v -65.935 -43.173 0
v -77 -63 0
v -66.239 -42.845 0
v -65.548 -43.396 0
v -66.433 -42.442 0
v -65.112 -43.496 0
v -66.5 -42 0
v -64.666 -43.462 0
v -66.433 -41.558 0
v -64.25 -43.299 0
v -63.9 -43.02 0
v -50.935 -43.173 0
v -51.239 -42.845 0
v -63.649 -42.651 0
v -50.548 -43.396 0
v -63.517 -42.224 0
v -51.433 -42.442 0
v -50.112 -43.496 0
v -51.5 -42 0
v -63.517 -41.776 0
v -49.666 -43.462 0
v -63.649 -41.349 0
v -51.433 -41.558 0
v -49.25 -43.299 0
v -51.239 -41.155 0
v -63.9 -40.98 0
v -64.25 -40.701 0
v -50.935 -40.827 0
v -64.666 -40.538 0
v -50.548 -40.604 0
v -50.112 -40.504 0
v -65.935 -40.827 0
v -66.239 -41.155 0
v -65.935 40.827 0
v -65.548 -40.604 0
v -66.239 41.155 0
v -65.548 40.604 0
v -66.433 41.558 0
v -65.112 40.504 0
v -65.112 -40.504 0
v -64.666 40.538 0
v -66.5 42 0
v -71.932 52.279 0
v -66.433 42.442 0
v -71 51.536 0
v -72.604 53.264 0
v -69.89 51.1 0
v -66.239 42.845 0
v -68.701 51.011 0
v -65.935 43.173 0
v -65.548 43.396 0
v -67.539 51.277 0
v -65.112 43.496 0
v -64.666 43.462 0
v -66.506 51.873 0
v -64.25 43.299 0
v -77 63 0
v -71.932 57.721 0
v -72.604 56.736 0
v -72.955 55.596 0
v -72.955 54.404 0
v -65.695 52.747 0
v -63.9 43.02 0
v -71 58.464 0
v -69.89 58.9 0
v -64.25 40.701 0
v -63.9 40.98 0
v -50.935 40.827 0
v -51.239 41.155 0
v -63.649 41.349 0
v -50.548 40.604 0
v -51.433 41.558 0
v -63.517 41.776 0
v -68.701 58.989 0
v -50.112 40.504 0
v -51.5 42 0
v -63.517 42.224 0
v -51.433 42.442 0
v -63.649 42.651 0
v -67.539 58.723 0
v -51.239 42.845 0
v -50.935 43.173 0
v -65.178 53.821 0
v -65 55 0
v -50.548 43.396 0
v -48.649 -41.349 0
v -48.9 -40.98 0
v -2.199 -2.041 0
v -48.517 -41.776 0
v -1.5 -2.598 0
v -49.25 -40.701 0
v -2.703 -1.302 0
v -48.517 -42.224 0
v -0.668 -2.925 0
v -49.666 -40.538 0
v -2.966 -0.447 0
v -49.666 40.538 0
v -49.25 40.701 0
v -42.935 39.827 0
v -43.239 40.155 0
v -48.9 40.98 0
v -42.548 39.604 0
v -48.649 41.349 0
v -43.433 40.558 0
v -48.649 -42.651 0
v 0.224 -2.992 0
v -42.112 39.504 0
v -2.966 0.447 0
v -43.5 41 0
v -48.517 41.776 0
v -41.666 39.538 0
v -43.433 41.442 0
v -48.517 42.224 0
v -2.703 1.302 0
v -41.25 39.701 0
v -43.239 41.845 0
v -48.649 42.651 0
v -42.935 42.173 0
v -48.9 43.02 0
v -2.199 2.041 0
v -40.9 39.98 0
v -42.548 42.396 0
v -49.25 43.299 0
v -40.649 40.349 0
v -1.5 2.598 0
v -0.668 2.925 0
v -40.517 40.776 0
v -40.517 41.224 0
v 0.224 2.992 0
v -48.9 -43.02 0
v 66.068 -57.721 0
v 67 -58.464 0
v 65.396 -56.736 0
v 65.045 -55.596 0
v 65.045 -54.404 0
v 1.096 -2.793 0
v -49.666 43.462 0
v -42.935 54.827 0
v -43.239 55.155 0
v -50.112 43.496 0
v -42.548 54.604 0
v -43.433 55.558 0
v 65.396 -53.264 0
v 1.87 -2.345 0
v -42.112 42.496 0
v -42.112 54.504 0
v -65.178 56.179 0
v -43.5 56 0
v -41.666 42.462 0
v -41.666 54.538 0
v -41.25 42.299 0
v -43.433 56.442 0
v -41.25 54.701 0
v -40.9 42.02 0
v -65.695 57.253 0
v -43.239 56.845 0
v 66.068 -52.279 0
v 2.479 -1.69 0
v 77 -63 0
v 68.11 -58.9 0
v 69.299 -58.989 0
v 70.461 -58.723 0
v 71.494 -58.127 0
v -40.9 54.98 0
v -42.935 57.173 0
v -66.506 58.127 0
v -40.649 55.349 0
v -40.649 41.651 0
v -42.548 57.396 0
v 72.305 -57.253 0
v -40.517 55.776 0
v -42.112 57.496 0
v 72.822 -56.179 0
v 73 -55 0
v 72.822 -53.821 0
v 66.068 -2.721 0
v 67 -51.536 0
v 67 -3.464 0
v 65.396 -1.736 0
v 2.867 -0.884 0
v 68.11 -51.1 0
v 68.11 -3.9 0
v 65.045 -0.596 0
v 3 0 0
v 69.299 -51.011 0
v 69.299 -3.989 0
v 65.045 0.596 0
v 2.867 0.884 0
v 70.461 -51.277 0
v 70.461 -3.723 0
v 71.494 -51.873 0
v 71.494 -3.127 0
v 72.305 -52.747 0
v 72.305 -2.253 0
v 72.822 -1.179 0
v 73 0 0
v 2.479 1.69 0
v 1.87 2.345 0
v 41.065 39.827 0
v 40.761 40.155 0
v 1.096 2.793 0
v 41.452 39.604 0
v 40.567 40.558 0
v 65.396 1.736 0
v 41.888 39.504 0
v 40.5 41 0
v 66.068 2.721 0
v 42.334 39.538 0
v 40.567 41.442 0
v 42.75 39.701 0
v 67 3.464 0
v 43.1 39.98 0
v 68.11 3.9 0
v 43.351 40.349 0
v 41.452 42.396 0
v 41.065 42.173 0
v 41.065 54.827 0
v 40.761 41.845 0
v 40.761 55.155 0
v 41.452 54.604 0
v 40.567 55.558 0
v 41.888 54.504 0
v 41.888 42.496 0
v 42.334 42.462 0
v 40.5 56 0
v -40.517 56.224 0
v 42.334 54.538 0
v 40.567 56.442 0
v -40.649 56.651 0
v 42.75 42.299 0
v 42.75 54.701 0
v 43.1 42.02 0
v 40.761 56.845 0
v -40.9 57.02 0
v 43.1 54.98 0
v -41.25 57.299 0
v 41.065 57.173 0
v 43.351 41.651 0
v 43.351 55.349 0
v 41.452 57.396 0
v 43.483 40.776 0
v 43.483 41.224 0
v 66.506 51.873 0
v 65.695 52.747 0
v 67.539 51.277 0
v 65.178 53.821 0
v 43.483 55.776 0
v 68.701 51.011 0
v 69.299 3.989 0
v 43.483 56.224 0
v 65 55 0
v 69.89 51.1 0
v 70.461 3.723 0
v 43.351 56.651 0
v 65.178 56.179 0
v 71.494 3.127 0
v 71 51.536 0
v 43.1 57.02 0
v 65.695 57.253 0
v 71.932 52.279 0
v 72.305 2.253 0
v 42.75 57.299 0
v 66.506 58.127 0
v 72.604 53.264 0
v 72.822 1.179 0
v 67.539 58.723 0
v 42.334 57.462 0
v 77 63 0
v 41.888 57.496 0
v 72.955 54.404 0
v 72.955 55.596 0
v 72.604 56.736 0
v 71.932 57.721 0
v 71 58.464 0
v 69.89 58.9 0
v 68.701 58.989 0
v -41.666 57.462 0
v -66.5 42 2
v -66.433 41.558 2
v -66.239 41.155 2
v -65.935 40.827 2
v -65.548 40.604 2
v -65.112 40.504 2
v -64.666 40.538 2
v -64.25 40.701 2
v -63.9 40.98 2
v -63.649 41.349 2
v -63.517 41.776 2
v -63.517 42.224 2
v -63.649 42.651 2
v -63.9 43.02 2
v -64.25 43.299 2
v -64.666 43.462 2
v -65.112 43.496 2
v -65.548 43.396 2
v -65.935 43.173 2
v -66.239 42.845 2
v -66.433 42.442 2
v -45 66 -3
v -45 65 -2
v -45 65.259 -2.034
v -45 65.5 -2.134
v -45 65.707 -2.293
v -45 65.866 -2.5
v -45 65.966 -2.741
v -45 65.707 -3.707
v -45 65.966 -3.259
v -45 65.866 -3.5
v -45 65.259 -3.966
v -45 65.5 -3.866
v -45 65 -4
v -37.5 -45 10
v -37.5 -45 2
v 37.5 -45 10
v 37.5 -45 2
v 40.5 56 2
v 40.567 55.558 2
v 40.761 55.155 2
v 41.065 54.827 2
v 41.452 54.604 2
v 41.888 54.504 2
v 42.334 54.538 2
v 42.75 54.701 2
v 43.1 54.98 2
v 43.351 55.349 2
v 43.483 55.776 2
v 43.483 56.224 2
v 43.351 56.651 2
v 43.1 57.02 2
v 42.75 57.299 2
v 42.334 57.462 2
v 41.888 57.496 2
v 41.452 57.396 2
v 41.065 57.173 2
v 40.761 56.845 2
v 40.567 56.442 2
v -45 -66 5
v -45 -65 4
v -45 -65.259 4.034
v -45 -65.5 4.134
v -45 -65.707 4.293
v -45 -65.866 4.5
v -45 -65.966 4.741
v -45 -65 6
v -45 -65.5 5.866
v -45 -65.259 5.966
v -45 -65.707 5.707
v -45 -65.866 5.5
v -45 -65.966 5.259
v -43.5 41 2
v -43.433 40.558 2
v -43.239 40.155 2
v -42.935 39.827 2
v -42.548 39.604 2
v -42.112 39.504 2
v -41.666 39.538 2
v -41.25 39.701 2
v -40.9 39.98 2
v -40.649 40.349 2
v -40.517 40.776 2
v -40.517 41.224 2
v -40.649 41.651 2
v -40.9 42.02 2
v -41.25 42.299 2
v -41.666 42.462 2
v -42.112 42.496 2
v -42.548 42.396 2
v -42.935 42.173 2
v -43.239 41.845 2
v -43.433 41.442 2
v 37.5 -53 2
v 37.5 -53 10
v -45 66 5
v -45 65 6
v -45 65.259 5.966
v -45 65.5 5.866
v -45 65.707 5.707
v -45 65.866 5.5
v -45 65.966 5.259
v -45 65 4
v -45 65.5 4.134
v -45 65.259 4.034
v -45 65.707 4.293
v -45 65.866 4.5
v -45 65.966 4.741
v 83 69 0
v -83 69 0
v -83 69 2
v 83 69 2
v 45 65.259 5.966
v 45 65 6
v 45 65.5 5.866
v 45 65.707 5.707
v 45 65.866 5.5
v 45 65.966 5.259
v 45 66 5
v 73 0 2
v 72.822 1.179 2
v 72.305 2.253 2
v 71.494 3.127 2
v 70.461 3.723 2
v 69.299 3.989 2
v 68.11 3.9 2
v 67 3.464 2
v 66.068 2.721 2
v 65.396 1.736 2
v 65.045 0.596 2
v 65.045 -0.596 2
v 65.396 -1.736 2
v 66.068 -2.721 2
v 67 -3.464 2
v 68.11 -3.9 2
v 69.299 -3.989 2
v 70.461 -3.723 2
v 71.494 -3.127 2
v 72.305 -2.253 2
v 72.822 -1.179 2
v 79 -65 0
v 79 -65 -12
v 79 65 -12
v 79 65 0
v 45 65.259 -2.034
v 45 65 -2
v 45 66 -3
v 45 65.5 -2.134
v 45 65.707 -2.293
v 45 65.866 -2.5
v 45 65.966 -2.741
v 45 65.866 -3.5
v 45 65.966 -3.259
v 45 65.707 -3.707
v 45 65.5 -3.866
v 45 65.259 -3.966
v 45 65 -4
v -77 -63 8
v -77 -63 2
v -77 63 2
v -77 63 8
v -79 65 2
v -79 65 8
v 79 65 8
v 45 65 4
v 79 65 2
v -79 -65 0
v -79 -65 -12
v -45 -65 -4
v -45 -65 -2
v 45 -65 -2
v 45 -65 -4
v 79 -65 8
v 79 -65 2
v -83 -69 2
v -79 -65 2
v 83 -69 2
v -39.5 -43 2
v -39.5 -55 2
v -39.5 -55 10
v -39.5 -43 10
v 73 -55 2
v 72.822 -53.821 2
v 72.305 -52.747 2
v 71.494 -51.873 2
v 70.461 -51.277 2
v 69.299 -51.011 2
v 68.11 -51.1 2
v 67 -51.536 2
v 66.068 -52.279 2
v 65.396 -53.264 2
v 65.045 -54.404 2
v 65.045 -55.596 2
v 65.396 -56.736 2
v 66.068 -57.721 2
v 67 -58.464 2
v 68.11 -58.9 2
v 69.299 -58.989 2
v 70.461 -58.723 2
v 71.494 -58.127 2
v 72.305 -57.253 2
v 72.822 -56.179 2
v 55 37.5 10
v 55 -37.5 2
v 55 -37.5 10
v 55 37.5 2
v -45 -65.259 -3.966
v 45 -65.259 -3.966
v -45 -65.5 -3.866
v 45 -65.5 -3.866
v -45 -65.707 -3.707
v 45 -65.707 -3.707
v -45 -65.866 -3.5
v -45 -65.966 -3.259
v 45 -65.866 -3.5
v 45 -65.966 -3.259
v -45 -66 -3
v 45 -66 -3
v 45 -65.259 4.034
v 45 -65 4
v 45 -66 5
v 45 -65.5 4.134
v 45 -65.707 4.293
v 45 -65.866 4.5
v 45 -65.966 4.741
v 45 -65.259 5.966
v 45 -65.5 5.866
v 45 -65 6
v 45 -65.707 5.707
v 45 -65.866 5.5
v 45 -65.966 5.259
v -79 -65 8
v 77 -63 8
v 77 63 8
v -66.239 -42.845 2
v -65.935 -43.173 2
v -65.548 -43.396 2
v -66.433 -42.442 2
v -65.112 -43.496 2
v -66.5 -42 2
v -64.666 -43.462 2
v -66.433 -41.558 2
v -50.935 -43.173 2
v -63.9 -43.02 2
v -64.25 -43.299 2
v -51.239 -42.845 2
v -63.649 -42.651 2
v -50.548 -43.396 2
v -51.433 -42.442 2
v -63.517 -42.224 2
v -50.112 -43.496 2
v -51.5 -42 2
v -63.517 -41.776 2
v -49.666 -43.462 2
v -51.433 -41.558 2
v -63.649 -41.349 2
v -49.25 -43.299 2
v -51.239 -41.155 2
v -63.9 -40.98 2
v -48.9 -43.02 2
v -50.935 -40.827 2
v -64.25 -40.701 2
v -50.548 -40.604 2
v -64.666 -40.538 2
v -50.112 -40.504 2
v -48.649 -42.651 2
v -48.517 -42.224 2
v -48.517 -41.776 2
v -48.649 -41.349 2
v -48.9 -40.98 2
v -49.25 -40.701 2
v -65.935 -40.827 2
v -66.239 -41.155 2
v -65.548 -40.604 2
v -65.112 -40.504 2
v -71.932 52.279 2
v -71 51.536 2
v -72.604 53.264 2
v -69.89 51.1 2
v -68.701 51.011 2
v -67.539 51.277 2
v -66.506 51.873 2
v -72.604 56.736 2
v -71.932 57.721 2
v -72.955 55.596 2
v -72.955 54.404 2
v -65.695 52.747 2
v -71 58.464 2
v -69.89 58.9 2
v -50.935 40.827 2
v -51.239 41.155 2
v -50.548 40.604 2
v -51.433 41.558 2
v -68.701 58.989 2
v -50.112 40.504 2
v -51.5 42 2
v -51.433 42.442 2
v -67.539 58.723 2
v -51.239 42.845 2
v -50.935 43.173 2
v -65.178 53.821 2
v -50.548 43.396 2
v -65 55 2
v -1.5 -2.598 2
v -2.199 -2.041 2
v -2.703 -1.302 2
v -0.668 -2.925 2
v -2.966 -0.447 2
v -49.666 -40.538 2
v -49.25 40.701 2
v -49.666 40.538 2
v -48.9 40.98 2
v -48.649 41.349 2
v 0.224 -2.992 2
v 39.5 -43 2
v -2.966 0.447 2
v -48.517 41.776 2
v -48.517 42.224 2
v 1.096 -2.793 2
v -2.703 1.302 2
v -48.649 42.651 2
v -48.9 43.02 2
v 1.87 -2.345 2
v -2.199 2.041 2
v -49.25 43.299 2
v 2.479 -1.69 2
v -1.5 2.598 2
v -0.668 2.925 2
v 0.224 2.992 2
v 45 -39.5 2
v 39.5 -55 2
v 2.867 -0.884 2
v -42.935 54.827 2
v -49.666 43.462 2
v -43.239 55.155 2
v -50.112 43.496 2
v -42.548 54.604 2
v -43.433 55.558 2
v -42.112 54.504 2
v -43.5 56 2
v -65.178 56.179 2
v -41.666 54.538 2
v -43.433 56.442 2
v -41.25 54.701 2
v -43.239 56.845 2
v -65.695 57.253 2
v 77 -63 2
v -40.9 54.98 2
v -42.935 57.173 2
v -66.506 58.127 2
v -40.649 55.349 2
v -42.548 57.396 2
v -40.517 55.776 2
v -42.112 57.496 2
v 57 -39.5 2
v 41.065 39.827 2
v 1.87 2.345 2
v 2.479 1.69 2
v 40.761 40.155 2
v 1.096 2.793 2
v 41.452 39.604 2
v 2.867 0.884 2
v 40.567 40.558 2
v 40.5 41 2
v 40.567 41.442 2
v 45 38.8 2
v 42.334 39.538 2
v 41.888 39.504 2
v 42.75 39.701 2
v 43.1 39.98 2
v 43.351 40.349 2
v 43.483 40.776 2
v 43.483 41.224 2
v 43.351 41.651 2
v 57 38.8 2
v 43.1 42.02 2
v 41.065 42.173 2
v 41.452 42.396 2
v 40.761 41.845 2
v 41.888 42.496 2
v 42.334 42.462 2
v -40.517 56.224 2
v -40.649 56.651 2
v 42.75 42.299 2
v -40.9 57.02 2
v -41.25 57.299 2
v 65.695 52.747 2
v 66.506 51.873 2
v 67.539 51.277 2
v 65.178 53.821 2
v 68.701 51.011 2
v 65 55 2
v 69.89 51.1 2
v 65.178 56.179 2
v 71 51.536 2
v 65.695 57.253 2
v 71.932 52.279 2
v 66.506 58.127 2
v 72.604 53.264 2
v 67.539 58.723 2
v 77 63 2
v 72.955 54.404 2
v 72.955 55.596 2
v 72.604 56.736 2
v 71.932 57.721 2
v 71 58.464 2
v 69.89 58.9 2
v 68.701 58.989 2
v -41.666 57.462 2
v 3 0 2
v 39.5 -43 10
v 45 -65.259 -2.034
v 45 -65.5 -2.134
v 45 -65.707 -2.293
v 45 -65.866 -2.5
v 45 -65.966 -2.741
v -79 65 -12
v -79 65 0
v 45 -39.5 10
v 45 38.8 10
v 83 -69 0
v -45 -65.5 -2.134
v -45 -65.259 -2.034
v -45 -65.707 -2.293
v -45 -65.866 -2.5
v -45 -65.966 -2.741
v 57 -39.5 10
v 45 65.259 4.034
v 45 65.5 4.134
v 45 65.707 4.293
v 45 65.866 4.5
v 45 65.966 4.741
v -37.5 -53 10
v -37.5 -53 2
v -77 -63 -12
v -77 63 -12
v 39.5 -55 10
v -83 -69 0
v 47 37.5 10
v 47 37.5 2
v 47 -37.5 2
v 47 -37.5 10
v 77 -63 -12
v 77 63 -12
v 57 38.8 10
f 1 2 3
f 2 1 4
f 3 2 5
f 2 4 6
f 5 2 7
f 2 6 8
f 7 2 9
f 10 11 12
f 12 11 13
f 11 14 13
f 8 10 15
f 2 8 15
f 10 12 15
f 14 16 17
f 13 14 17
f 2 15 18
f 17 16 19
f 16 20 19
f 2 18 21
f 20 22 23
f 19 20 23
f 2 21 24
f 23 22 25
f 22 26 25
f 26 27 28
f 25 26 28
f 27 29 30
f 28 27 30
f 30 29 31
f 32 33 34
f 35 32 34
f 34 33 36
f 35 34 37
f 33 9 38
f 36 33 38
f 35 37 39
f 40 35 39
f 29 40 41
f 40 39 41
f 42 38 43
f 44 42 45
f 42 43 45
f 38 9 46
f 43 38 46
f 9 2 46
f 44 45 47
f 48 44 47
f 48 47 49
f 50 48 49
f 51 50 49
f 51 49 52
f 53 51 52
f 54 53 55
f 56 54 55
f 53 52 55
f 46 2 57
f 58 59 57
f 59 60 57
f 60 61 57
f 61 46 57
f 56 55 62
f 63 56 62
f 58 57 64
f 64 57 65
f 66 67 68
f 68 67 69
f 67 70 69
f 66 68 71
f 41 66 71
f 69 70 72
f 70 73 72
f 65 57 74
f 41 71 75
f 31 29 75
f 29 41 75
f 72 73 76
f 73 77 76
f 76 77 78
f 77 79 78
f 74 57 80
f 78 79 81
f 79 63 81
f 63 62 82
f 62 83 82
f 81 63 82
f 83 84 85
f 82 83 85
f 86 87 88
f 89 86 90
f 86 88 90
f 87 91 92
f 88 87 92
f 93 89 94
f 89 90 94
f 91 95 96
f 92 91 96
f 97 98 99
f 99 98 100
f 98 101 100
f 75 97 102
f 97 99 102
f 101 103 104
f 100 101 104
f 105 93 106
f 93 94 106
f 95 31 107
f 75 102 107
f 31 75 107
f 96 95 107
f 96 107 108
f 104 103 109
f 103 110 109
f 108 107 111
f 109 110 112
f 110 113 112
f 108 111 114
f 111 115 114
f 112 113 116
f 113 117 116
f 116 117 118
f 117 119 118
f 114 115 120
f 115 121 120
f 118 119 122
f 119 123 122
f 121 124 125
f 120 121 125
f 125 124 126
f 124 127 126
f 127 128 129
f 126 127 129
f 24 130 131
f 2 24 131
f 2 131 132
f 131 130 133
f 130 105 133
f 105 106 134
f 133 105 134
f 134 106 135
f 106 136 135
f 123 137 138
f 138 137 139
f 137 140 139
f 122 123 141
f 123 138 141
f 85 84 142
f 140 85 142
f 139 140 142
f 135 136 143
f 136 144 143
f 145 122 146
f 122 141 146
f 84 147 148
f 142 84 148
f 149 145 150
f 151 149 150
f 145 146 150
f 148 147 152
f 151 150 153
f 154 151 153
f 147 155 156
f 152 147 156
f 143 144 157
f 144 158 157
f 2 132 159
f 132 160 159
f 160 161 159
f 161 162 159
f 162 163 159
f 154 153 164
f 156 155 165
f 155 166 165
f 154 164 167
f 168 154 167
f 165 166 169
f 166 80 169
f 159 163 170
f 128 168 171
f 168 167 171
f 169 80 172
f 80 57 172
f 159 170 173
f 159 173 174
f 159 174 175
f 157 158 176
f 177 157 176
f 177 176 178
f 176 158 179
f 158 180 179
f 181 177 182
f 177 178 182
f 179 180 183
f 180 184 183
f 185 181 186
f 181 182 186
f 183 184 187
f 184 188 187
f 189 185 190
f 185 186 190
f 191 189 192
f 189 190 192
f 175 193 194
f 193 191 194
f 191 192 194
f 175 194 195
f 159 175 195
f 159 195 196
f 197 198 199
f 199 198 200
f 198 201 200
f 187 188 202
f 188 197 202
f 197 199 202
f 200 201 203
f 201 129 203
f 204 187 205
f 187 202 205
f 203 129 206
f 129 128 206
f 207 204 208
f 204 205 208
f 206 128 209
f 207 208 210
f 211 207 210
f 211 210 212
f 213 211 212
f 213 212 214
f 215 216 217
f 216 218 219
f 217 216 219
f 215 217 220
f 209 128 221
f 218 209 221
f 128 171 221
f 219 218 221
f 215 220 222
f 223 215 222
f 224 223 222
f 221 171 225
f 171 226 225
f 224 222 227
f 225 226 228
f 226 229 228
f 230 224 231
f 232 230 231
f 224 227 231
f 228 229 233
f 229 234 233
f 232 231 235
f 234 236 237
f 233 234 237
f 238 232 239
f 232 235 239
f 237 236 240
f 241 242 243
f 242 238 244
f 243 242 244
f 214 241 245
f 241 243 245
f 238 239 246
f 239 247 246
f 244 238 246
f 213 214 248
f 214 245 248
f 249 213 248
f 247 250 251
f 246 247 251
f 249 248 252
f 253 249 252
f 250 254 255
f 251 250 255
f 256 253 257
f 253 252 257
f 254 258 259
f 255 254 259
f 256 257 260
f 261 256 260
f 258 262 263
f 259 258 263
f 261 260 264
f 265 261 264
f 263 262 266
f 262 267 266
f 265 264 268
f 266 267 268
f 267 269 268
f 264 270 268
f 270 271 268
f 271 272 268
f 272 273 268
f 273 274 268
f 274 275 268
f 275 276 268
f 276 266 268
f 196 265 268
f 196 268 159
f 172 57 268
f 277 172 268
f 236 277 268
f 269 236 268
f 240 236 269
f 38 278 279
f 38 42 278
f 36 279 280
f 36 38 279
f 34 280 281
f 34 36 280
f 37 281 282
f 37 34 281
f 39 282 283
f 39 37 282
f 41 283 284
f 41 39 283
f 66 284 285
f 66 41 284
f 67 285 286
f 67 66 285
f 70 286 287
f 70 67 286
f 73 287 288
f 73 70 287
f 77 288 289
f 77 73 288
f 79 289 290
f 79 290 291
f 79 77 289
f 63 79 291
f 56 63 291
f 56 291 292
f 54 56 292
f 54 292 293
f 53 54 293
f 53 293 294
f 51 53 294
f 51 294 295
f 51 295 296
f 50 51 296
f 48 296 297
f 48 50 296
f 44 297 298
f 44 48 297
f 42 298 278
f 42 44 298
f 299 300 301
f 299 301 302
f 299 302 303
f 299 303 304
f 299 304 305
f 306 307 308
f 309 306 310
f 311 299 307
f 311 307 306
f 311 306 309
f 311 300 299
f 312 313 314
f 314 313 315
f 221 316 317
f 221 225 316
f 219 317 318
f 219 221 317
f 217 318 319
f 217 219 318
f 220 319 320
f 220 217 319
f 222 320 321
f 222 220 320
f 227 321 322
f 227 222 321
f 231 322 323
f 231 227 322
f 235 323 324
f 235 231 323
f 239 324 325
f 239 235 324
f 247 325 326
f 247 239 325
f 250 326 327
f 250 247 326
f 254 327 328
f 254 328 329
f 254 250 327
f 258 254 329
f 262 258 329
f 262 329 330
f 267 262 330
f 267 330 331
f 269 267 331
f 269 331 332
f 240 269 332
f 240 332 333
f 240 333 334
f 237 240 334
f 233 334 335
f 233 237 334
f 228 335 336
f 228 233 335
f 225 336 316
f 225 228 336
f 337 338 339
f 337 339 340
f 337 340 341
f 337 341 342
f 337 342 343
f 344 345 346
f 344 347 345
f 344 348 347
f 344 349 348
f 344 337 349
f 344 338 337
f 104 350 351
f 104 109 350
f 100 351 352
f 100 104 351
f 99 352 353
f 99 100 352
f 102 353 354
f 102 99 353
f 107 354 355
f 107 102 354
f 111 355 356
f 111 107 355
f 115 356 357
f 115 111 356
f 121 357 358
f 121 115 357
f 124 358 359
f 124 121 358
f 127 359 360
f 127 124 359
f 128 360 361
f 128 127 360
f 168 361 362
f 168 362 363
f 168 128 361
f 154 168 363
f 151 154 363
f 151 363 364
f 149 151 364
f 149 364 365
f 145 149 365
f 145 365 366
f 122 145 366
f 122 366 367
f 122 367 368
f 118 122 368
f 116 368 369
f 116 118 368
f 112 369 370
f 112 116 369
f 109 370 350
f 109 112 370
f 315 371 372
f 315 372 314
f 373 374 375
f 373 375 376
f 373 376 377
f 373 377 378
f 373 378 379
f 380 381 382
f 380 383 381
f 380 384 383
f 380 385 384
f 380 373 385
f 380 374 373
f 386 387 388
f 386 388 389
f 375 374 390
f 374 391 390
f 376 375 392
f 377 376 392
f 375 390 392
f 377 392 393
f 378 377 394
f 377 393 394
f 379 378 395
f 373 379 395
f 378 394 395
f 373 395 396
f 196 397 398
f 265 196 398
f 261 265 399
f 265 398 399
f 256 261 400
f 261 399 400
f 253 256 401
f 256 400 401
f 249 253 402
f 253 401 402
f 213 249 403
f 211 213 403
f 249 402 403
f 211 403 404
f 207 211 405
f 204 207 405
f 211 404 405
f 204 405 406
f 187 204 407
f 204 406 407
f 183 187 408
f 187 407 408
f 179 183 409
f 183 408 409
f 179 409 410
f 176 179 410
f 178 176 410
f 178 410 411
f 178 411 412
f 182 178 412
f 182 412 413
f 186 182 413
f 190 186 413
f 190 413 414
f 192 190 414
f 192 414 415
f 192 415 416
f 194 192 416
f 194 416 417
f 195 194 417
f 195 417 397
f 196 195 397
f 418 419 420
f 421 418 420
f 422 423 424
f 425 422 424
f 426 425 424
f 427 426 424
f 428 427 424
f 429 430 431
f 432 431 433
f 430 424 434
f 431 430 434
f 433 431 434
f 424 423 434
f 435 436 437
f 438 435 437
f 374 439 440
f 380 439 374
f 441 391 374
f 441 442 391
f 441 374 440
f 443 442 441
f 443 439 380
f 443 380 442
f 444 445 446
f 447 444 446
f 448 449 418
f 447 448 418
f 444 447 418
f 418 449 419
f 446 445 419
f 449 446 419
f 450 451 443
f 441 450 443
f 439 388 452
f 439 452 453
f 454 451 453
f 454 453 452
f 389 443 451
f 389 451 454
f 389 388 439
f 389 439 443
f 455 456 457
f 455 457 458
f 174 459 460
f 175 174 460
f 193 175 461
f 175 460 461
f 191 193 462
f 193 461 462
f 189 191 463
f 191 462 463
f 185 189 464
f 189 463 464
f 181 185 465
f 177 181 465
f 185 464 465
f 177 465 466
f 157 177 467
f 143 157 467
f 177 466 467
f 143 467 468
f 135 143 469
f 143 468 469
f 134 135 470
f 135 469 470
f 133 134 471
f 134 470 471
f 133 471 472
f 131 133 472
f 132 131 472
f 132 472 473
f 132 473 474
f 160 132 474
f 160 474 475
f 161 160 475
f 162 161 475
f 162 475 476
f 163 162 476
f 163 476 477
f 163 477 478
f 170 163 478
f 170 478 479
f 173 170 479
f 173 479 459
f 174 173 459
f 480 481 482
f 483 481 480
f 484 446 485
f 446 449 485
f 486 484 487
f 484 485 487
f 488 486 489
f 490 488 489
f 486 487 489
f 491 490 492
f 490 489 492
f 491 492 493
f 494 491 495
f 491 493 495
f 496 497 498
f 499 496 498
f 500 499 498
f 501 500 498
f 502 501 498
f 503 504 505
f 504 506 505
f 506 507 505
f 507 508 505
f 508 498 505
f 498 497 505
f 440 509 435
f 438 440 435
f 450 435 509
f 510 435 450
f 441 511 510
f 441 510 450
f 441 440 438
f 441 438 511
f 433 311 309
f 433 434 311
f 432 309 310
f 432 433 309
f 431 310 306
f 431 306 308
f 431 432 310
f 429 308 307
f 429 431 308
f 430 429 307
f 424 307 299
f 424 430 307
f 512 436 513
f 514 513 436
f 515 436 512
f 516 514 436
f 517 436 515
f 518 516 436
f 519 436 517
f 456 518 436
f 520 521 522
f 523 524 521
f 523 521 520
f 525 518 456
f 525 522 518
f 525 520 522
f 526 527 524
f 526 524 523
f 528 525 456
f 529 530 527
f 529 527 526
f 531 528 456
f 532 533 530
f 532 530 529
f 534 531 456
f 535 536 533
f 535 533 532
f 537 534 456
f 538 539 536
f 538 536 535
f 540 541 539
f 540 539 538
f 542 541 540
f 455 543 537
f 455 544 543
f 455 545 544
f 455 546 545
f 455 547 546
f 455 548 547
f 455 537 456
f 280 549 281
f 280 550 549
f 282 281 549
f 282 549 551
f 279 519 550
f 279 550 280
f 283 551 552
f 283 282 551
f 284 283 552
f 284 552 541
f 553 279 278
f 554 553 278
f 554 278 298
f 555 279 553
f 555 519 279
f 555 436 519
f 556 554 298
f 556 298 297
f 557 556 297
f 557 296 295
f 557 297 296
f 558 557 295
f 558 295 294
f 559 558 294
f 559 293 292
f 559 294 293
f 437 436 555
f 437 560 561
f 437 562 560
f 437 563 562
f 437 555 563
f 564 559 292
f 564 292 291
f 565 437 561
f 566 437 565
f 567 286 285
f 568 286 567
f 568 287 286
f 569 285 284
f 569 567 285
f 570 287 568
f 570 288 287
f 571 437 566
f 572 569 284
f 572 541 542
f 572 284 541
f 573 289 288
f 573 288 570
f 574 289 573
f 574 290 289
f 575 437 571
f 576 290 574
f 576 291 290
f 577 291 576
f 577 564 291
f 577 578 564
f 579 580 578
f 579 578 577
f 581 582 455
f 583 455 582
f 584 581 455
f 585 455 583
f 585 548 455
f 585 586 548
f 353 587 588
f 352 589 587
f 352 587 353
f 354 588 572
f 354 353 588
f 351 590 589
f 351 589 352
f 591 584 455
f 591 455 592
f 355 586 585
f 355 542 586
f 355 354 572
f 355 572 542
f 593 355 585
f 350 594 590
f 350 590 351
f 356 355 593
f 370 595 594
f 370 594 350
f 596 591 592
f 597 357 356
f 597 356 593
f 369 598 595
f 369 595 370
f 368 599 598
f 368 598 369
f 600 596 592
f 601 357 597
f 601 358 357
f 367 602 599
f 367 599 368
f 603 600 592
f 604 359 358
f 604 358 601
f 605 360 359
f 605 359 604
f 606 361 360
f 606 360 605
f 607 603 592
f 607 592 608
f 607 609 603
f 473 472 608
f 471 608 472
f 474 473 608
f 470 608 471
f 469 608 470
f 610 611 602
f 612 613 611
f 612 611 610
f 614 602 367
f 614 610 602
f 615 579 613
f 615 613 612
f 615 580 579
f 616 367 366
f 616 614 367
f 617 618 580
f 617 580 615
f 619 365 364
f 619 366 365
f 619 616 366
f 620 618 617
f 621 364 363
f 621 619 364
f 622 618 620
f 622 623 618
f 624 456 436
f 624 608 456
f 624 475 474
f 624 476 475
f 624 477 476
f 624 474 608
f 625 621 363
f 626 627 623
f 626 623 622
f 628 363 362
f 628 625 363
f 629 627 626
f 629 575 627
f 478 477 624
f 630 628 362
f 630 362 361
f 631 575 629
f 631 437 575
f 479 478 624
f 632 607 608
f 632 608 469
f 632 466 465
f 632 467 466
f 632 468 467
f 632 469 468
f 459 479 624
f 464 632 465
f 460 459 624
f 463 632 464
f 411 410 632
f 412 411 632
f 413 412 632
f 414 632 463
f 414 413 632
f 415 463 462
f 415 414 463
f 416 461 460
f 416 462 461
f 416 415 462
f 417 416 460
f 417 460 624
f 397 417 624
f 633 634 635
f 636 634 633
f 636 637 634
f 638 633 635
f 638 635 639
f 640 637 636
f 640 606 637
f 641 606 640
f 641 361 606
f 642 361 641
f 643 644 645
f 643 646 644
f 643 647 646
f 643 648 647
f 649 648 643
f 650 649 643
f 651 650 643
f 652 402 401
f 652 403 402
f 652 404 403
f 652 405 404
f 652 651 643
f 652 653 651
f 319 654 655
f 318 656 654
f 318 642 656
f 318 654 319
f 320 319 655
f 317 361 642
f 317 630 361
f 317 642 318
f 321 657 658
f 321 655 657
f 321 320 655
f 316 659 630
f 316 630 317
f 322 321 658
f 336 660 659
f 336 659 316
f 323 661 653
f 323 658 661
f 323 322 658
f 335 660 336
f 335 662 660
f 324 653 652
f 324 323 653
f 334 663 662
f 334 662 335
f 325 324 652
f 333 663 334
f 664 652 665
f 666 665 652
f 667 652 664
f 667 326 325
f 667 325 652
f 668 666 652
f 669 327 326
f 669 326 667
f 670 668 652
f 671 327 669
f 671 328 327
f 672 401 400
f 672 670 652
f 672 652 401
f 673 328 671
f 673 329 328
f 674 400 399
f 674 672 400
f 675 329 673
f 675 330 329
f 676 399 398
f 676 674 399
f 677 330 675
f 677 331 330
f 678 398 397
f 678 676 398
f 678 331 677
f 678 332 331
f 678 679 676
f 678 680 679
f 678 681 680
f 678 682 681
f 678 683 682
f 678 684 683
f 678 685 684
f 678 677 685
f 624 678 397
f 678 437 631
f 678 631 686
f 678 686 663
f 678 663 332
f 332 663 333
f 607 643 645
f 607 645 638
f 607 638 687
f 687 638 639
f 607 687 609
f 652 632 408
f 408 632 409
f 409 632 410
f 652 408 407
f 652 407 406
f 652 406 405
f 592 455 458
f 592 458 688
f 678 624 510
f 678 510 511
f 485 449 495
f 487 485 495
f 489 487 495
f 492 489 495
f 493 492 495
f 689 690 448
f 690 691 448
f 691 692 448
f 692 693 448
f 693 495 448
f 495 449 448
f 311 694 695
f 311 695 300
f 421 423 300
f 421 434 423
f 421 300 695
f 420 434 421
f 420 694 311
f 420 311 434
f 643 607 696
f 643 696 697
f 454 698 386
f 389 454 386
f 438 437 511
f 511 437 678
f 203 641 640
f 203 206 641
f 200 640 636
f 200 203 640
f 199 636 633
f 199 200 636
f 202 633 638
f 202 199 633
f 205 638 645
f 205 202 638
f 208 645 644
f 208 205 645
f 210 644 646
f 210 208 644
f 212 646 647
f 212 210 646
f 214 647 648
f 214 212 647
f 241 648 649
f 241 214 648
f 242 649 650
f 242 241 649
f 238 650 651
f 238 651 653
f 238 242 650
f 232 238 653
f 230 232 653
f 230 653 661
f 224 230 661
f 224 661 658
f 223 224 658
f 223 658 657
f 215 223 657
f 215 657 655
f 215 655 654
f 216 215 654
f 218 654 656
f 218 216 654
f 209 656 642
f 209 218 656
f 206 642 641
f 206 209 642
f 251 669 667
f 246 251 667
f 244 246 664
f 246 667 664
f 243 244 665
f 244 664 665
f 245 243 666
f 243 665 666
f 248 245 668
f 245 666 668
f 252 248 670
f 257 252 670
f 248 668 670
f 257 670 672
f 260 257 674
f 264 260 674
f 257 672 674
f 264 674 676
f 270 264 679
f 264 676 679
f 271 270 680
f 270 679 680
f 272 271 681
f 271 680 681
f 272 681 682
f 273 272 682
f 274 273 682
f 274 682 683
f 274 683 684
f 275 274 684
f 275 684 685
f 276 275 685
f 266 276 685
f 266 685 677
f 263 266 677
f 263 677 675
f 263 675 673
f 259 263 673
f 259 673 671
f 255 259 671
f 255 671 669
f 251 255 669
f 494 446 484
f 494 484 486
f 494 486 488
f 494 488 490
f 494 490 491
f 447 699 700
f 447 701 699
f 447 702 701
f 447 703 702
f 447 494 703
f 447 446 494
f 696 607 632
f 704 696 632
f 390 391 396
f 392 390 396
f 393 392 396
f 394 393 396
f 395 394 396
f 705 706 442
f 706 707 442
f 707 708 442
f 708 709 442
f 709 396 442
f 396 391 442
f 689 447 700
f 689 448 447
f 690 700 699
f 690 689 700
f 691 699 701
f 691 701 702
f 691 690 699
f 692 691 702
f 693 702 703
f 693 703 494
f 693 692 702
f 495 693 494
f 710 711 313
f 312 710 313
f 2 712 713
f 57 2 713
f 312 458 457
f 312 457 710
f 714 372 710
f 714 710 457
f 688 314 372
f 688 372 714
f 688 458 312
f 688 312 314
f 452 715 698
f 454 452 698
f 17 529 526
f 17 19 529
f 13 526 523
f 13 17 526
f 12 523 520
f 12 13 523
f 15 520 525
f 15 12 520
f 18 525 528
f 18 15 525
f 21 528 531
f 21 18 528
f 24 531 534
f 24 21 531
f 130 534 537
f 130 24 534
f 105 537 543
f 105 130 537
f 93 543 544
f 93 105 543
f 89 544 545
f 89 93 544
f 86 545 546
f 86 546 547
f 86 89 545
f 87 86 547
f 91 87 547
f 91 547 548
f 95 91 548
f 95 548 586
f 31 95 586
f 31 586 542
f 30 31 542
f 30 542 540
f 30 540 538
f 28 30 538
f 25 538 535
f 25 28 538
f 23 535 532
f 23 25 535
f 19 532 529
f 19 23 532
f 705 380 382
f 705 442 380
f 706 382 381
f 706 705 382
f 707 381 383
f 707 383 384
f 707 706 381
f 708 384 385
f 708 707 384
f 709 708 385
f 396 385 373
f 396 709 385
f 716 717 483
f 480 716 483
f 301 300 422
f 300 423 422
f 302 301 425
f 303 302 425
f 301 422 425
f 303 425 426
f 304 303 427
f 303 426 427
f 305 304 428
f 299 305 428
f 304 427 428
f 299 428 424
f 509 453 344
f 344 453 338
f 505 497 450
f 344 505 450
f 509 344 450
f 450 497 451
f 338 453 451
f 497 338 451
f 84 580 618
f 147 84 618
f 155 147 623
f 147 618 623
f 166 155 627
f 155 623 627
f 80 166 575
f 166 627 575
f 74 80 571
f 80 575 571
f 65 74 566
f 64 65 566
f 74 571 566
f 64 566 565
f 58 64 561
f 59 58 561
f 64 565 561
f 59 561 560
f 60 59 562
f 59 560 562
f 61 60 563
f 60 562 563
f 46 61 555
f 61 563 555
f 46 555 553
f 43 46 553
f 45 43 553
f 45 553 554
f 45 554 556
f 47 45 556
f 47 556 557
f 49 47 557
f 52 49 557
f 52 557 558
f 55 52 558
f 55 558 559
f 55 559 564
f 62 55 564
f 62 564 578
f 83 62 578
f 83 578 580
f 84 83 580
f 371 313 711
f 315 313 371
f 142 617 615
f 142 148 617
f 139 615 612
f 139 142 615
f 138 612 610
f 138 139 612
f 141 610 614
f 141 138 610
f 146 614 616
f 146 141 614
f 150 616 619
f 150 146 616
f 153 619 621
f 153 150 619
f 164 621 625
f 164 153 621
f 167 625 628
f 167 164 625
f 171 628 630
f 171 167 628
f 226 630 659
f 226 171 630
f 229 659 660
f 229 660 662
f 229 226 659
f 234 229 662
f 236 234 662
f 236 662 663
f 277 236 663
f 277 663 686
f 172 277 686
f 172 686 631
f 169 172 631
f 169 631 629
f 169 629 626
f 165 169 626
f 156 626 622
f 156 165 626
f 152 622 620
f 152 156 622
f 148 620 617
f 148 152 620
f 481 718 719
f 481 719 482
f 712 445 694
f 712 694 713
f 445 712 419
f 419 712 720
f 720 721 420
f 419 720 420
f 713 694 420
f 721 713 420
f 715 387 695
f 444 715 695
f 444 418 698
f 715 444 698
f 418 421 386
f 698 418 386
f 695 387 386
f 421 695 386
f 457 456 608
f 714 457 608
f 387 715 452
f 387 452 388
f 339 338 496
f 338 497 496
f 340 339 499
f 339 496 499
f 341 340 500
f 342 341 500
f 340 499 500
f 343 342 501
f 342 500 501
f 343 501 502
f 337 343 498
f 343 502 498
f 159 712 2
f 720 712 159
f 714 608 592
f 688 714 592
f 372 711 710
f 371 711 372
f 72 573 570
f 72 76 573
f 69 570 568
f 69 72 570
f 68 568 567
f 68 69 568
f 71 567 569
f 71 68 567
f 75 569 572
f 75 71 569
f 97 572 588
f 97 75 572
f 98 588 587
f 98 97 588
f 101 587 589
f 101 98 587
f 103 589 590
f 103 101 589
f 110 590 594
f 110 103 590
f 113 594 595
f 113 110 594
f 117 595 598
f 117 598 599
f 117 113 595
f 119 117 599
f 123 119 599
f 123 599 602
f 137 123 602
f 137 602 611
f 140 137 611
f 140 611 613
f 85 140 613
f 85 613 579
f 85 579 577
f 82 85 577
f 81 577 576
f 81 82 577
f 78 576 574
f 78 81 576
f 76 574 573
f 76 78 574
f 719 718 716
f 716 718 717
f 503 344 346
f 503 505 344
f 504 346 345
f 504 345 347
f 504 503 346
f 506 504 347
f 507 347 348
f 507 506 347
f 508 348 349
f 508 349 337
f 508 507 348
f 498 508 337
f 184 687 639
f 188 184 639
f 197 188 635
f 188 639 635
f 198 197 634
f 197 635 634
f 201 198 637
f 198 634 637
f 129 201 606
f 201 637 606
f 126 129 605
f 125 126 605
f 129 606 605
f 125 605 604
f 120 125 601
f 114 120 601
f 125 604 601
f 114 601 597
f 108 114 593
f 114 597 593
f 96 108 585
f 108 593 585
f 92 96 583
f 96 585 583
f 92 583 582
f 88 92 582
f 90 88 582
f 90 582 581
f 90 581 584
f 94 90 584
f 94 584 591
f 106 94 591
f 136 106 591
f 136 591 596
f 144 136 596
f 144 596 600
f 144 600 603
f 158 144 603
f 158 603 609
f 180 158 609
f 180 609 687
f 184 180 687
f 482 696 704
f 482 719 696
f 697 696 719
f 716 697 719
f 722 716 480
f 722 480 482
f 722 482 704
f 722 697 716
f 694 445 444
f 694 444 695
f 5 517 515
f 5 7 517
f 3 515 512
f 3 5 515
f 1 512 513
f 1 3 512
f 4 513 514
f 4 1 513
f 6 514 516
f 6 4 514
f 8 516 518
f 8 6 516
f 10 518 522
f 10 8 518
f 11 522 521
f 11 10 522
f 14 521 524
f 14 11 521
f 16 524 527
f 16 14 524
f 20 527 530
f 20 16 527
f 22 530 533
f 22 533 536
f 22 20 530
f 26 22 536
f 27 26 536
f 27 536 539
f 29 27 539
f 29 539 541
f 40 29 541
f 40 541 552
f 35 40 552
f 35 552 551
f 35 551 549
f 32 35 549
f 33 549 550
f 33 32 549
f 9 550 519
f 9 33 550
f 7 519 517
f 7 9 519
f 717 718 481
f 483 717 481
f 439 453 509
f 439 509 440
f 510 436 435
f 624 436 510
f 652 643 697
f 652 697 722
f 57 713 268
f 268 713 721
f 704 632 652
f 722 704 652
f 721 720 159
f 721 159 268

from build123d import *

# Parameters (mm, degrees)
SKETCH_1_W                     = 166
SKETCH_1_H                     = 138
EXTRUDE_1_DEPTH                = 2
EXTRUDE_2_DEPTH                = 6
EXTRUDE_2_DEPTH_BACK           = 14
SKETCH_2_W                     = 158
SKETCH_2_H                     = 130
SKETCH_2_W_2                   = 154
SKETCH_2_H_2                   = 126
SKETCH_3_R                     = 1.5
EXTRUDE_2_2_DEPTH              = 5
SKETCH_5_R                     = 1.5
EXTRUDE_3_DEPTH                = 5
SKETCH_4_R                     = 1.5
EXTRUDE_4_DEPTH                = 5
SKETCH_6_W                     = 75
SKETCH_6_H                     = 2
SKETCH_6_W_2                   = 2
SKETCH_6_H_2                   = 75
EXTRUDE_5_DEPTH                = 8
SKETCH_9_W                     = 90
SKETCH_9_H                     = 2
EXTRUDE_6_DEPTH                = 1
FILLET_1_R                     = 1
SKETCH_11_W                    = 90
SKETCH_11_H                    = 2
EXTRUDE_7_DEPTH                = 1
FILLET_2_R                     = 1
PATTERN_LINEAR_1_COUNT         = 2
PATTERN_LINEAR_1_PITCH         = 8
FILLET_1_OF_PATTERN_LINEAR_1_R = 1
PATTERN_LINEAR_2_COUNT         = 2
PATTERN_LINEAR_2_PITCH         = 8
FILLET_2_OF_PATTERN_LINEAR_2_R = 1
SKETCH_12_W                    = 2
SKETCH_12_H                    = 12
SKETCH_12_W_2                  = 12
SKETCH_12_H_2                  = 2
SKETCH_12_H_3                  = 1.3
EXTRUDE_8_DEPTH                = 8
CUT_EXTRUDE_2_DEPTH            = 109.839331126
CUT_EXTRUDE_2_DEPTH_BACK       = 109.839331126
SKETCH_5_4_R                   = 1.5
CUT_EXTRUDE_3_DEPTH            = 109.839331126
CUT_EXTRUDE_3_DEPTH_BACK       = 109.839331126
SKETCH_4_3_R                   = 1.5
CUT_EXTRUDE_4_DEPTH            = 109.839331126
CUT_EXTRUDE_4_DEPTH_BACK       = 109.839331126
SKETCH_3_2_R                   = 1.5
SKETCH_13_R                    = 3
SKETCH_13_R_2                  = 4
CUT_EXTRUDE_5_DEPTH            = 109.839331126


with BuildPart() as part:
    # 스케치1 → 보스-돌출1 (new body)
    with BuildSketch(Plane.XY):
        Rectangle(SKETCH_1_W, SKETCH_1_H)
    extrude(amount=EXTRUDE_1_DEPTH)

    # 스케치2 → Extrude 2 (add, two sides: drawn at the far end of the back side and taken through both)
    with BuildSketch(Plane.XY.offset(2).offset(-EXTRUDE_2_DEPTH_BACK)):
        Rectangle(SKETCH_2_W, SKETCH_2_H)
        Rectangle(SKETCH_2_W_2, SKETCH_2_H_2, mode=Mode.SUBTRACT)
    extrude(amount=EXTRUDE_2_DEPTH + EXTRUDE_2_DEPTH_BACK)

    # 스케치3 → Extrude 2 2 (add)
    with BuildSketch(Plane.XY.offset(2)):
        with Locations(Location((-65, -42, 0), (0, 0, 180))):
            Circle(SKETCH_3_R)
        with Locations(Location((-50, -42, 0), (0, 0, 180))):
            Circle(SKETCH_3_R)
        with Locations(Location((-65, 42, 0), (0, 0, 180))):
            Circle(SKETCH_3_R)
        with Locations(Location((-50, 42, 0), (0, 0, 180))):
            Circle(SKETCH_3_R)
    extrude(amount=EXTRUDE_2_2_DEPTH)

    # 스케치5 → 보스-돌출3 (add)
    with BuildSketch(Plane.XY.offset(2)):
        with Locations(Location((42, 56, 0), (0, 0, 180))):
            Circle(SKETCH_5_R)
        with Locations(Location((42, 41, 0), (0, 0, 180))):
            Circle(SKETCH_5_R)
    extrude(amount=EXTRUDE_3_DEPTH)

    # 스케치4 → 보스-돌출4 (add)
    with BuildSketch(Plane.XY.offset(2)):
        with Locations(Location((-42, 56, 0), (0, 0, 180))):
            Circle(SKETCH_4_R)
        with Locations(Location((-42, 41, 0), (0, 0, 180))):
            Circle(SKETCH_4_R)
    extrude(amount=EXTRUDE_4_DEPTH)

    # 스케치6 → 보스-돌출5 (add)
    with BuildSketch(Plane.XY.offset(2)):
        with Locations((0, -54)):
            Rectangle(SKETCH_6_W, SKETCH_6_H)
        with Locations((0, -44)):
            Rectangle(SKETCH_6_W, SKETCH_6_H)
        with Locations((46, 0)):
            Rectangle(SKETCH_6_W_2, SKETCH_6_H_2)
        with Locations((56, 0)):
            Rectangle(SKETCH_6_W_2, SKETCH_6_H_2)
    extrude(amount=EXTRUDE_5_DEPTH)

    # 스케치9 → 보스-돌출6 (add)
    with BuildSketch(Plane.XZ.offset(65)):
        with Locations((0, 5)):
            Rectangle(SKETCH_9_W, SKETCH_9_H)
    extrude_6 = extrude(amount=EXTRUDE_6_DEPTH)

    # 필렛1
    fillet_1_edges = [part.edges().sort_by_distance(p)[0] for p in [
        (0, -66, 4),
        (0, -66, 6),
    ]]
    fillet(fillet_1_edges, radius=FILLET_1_R - 0.0001)  # a hair under: the kernel refuses the full size

    # 스케치11 → 보스-돌출7 (add)
    with BuildSketch(Plane(origin=(0, 65, 0), x_dir=(1, 0, 0), z_dir=(0, 1, 0))):
        with Locations((0, -5)):
            Rectangle(SKETCH_11_W, SKETCH_11_H)
    extrude_7 = extrude(amount=EXTRUDE_7_DEPTH)

    # 필렛2
    fillet_2_edges = [part.edges().sort_by_distance(p)[0] for p in [
        (0, 66, 4),
        (0, 66, 6),
    ]]
    fillet(fillet_2_edges, radius=FILLET_2_R - 0.0001)  # a hair under: the kernel refuses the full size

    # 선형 패턴1: 보스-돌출6 ×2
    with Locations(*[(0, 0, -i * PATTERN_LINEAR_1_PITCH) for i in range(1, PATTERN_LINEAR_1_COUNT)]):
        add(extrude_6)

    # 필렛1 of 선형 패턴1
    fillet_1_of_pattern_linear_1_edges = [part.edges().sort_by_distance(p)[0] for p in [
        (0, -66, -4),
        (0, -66, -2),
    ]]
    fillet(fillet_1_of_pattern_linear_1_edges, radius=FILLET_1_OF_PATTERN_LINEAR_1_R - 0.0001)  # a hair under: the kernel refuses the full size

    # 선형 패턴2: 보스-돌출7 ×2
    with Locations(*[(0, 0, -i * PATTERN_LINEAR_2_PITCH) for i in range(1, PATTERN_LINEAR_2_COUNT)]):
        add(extrude_7)

    # 필렛2 of 선형 패턴2
    fillet_2_of_pattern_linear_2_edges = [part.edges().sort_by_distance(p)[0] for p in [
        (0, 66, -4),
        (0, 66, -2),
    ]]
    fillet(fillet_2_of_pattern_linear_2_edges, radius=FILLET_2_OF_PATTERN_LINEAR_2_R - 0.0001)  # a hair under: the kernel refuses the full size

    # 스케치12 → 보스-돌출8 (add)
    with BuildSketch(Plane.XY.offset(2)):
        with Locations((-38.5, -49)):
            Rectangle(SKETCH_12_W, SKETCH_12_H)
        with Locations((38.5, -49)):
            Rectangle(SKETCH_12_W, SKETCH_12_H)
        with Locations((51, -38.5)):
            Rectangle(SKETCH_12_W_2, SKETCH_12_H_2)
        with Locations((51, 38.15)):
            Rectangle(SKETCH_12_W_2, SKETCH_12_H_3)
    extrude(amount=EXTRUDE_8_DEPTH)

    # 스케치5<4> → 컷-돌출2 (cut, two sides: drawn at the far end of the back side and taken through both)
    with BuildSketch(Plane.XY.offset(2).offset(-CUT_EXTRUDE_2_DEPTH_BACK)):
        with Locations(Location((42, 56, 0), (0, 0, 180))):
            Circle(SKETCH_5_4_R)
        with Locations(Location((42, 41, 0), (0, 0, 180))):
            Circle(SKETCH_5_4_R)
    extrude(amount=CUT_EXTRUDE_2_DEPTH + CUT_EXTRUDE_2_DEPTH_BACK, mode=Mode.SUBTRACT)

    # 스케치4<3> → 컷-돌출3 (cut, two sides: drawn at the far end of the back side and taken through both)
    with BuildSketch(Plane.XY.offset(2).offset(-CUT_EXTRUDE_3_DEPTH_BACK)):
        with Locations(Location((-42, 56, 0), (0, 0, 180))):
            Circle(SKETCH_4_3_R)
        with Locations(Location((-42, 41, 0), (0, 0, 180))):
            Circle(SKETCH_4_3_R)
    extrude(amount=CUT_EXTRUDE_3_DEPTH + CUT_EXTRUDE_3_DEPTH_BACK, mode=Mode.SUBTRACT)

    # 스케치3<2> → 컷-돌출4 (cut, two sides: drawn at the far end of the back side and taken through both)
    with BuildSketch(Plane.XY.offset(2).offset(-CUT_EXTRUDE_4_DEPTH_BACK)):
        with Locations(Location((-65, -42, 0), (0, 0, 180))):
            Circle(SKETCH_3_2_R)
        with Locations(Location((-50, -42, 0), (0, 0, 180))):
            Circle(SKETCH_3_2_R)
        with Locations(Location((-65, 42, 0), (0, 0, 180))):
            Circle(SKETCH_3_2_R)
        with Locations(Location((-50, 42, 0), (0, 0, 180))):
            Circle(SKETCH_3_2_R)
    extrude(amount=CUT_EXTRUDE_4_DEPTH + CUT_EXTRUDE_4_DEPTH_BACK, mode=Mode.SUBTRACT)

    # 스케치13 → 컷-돌출5 (cut, through all)
    with BuildSketch(Plane.XY.offset(2)):
        Circle(SKETCH_13_R)
        with Locations((-69, 55)):
            Circle(SKETCH_13_R_2)
        with Locations(Location((69, 55, 0), (0, 0, 180))):
            Circle(SKETCH_13_R_2)
        with Locations((69, -55)):
            Circle(SKETCH_13_R_2)
        with Locations((69, 0)):
            Circle(SKETCH_13_R_2)
    extrude(amount=-CUT_EXTRUDE_5_DEPTH, mode=Mode.SUBTRACT)


solid = part.part
